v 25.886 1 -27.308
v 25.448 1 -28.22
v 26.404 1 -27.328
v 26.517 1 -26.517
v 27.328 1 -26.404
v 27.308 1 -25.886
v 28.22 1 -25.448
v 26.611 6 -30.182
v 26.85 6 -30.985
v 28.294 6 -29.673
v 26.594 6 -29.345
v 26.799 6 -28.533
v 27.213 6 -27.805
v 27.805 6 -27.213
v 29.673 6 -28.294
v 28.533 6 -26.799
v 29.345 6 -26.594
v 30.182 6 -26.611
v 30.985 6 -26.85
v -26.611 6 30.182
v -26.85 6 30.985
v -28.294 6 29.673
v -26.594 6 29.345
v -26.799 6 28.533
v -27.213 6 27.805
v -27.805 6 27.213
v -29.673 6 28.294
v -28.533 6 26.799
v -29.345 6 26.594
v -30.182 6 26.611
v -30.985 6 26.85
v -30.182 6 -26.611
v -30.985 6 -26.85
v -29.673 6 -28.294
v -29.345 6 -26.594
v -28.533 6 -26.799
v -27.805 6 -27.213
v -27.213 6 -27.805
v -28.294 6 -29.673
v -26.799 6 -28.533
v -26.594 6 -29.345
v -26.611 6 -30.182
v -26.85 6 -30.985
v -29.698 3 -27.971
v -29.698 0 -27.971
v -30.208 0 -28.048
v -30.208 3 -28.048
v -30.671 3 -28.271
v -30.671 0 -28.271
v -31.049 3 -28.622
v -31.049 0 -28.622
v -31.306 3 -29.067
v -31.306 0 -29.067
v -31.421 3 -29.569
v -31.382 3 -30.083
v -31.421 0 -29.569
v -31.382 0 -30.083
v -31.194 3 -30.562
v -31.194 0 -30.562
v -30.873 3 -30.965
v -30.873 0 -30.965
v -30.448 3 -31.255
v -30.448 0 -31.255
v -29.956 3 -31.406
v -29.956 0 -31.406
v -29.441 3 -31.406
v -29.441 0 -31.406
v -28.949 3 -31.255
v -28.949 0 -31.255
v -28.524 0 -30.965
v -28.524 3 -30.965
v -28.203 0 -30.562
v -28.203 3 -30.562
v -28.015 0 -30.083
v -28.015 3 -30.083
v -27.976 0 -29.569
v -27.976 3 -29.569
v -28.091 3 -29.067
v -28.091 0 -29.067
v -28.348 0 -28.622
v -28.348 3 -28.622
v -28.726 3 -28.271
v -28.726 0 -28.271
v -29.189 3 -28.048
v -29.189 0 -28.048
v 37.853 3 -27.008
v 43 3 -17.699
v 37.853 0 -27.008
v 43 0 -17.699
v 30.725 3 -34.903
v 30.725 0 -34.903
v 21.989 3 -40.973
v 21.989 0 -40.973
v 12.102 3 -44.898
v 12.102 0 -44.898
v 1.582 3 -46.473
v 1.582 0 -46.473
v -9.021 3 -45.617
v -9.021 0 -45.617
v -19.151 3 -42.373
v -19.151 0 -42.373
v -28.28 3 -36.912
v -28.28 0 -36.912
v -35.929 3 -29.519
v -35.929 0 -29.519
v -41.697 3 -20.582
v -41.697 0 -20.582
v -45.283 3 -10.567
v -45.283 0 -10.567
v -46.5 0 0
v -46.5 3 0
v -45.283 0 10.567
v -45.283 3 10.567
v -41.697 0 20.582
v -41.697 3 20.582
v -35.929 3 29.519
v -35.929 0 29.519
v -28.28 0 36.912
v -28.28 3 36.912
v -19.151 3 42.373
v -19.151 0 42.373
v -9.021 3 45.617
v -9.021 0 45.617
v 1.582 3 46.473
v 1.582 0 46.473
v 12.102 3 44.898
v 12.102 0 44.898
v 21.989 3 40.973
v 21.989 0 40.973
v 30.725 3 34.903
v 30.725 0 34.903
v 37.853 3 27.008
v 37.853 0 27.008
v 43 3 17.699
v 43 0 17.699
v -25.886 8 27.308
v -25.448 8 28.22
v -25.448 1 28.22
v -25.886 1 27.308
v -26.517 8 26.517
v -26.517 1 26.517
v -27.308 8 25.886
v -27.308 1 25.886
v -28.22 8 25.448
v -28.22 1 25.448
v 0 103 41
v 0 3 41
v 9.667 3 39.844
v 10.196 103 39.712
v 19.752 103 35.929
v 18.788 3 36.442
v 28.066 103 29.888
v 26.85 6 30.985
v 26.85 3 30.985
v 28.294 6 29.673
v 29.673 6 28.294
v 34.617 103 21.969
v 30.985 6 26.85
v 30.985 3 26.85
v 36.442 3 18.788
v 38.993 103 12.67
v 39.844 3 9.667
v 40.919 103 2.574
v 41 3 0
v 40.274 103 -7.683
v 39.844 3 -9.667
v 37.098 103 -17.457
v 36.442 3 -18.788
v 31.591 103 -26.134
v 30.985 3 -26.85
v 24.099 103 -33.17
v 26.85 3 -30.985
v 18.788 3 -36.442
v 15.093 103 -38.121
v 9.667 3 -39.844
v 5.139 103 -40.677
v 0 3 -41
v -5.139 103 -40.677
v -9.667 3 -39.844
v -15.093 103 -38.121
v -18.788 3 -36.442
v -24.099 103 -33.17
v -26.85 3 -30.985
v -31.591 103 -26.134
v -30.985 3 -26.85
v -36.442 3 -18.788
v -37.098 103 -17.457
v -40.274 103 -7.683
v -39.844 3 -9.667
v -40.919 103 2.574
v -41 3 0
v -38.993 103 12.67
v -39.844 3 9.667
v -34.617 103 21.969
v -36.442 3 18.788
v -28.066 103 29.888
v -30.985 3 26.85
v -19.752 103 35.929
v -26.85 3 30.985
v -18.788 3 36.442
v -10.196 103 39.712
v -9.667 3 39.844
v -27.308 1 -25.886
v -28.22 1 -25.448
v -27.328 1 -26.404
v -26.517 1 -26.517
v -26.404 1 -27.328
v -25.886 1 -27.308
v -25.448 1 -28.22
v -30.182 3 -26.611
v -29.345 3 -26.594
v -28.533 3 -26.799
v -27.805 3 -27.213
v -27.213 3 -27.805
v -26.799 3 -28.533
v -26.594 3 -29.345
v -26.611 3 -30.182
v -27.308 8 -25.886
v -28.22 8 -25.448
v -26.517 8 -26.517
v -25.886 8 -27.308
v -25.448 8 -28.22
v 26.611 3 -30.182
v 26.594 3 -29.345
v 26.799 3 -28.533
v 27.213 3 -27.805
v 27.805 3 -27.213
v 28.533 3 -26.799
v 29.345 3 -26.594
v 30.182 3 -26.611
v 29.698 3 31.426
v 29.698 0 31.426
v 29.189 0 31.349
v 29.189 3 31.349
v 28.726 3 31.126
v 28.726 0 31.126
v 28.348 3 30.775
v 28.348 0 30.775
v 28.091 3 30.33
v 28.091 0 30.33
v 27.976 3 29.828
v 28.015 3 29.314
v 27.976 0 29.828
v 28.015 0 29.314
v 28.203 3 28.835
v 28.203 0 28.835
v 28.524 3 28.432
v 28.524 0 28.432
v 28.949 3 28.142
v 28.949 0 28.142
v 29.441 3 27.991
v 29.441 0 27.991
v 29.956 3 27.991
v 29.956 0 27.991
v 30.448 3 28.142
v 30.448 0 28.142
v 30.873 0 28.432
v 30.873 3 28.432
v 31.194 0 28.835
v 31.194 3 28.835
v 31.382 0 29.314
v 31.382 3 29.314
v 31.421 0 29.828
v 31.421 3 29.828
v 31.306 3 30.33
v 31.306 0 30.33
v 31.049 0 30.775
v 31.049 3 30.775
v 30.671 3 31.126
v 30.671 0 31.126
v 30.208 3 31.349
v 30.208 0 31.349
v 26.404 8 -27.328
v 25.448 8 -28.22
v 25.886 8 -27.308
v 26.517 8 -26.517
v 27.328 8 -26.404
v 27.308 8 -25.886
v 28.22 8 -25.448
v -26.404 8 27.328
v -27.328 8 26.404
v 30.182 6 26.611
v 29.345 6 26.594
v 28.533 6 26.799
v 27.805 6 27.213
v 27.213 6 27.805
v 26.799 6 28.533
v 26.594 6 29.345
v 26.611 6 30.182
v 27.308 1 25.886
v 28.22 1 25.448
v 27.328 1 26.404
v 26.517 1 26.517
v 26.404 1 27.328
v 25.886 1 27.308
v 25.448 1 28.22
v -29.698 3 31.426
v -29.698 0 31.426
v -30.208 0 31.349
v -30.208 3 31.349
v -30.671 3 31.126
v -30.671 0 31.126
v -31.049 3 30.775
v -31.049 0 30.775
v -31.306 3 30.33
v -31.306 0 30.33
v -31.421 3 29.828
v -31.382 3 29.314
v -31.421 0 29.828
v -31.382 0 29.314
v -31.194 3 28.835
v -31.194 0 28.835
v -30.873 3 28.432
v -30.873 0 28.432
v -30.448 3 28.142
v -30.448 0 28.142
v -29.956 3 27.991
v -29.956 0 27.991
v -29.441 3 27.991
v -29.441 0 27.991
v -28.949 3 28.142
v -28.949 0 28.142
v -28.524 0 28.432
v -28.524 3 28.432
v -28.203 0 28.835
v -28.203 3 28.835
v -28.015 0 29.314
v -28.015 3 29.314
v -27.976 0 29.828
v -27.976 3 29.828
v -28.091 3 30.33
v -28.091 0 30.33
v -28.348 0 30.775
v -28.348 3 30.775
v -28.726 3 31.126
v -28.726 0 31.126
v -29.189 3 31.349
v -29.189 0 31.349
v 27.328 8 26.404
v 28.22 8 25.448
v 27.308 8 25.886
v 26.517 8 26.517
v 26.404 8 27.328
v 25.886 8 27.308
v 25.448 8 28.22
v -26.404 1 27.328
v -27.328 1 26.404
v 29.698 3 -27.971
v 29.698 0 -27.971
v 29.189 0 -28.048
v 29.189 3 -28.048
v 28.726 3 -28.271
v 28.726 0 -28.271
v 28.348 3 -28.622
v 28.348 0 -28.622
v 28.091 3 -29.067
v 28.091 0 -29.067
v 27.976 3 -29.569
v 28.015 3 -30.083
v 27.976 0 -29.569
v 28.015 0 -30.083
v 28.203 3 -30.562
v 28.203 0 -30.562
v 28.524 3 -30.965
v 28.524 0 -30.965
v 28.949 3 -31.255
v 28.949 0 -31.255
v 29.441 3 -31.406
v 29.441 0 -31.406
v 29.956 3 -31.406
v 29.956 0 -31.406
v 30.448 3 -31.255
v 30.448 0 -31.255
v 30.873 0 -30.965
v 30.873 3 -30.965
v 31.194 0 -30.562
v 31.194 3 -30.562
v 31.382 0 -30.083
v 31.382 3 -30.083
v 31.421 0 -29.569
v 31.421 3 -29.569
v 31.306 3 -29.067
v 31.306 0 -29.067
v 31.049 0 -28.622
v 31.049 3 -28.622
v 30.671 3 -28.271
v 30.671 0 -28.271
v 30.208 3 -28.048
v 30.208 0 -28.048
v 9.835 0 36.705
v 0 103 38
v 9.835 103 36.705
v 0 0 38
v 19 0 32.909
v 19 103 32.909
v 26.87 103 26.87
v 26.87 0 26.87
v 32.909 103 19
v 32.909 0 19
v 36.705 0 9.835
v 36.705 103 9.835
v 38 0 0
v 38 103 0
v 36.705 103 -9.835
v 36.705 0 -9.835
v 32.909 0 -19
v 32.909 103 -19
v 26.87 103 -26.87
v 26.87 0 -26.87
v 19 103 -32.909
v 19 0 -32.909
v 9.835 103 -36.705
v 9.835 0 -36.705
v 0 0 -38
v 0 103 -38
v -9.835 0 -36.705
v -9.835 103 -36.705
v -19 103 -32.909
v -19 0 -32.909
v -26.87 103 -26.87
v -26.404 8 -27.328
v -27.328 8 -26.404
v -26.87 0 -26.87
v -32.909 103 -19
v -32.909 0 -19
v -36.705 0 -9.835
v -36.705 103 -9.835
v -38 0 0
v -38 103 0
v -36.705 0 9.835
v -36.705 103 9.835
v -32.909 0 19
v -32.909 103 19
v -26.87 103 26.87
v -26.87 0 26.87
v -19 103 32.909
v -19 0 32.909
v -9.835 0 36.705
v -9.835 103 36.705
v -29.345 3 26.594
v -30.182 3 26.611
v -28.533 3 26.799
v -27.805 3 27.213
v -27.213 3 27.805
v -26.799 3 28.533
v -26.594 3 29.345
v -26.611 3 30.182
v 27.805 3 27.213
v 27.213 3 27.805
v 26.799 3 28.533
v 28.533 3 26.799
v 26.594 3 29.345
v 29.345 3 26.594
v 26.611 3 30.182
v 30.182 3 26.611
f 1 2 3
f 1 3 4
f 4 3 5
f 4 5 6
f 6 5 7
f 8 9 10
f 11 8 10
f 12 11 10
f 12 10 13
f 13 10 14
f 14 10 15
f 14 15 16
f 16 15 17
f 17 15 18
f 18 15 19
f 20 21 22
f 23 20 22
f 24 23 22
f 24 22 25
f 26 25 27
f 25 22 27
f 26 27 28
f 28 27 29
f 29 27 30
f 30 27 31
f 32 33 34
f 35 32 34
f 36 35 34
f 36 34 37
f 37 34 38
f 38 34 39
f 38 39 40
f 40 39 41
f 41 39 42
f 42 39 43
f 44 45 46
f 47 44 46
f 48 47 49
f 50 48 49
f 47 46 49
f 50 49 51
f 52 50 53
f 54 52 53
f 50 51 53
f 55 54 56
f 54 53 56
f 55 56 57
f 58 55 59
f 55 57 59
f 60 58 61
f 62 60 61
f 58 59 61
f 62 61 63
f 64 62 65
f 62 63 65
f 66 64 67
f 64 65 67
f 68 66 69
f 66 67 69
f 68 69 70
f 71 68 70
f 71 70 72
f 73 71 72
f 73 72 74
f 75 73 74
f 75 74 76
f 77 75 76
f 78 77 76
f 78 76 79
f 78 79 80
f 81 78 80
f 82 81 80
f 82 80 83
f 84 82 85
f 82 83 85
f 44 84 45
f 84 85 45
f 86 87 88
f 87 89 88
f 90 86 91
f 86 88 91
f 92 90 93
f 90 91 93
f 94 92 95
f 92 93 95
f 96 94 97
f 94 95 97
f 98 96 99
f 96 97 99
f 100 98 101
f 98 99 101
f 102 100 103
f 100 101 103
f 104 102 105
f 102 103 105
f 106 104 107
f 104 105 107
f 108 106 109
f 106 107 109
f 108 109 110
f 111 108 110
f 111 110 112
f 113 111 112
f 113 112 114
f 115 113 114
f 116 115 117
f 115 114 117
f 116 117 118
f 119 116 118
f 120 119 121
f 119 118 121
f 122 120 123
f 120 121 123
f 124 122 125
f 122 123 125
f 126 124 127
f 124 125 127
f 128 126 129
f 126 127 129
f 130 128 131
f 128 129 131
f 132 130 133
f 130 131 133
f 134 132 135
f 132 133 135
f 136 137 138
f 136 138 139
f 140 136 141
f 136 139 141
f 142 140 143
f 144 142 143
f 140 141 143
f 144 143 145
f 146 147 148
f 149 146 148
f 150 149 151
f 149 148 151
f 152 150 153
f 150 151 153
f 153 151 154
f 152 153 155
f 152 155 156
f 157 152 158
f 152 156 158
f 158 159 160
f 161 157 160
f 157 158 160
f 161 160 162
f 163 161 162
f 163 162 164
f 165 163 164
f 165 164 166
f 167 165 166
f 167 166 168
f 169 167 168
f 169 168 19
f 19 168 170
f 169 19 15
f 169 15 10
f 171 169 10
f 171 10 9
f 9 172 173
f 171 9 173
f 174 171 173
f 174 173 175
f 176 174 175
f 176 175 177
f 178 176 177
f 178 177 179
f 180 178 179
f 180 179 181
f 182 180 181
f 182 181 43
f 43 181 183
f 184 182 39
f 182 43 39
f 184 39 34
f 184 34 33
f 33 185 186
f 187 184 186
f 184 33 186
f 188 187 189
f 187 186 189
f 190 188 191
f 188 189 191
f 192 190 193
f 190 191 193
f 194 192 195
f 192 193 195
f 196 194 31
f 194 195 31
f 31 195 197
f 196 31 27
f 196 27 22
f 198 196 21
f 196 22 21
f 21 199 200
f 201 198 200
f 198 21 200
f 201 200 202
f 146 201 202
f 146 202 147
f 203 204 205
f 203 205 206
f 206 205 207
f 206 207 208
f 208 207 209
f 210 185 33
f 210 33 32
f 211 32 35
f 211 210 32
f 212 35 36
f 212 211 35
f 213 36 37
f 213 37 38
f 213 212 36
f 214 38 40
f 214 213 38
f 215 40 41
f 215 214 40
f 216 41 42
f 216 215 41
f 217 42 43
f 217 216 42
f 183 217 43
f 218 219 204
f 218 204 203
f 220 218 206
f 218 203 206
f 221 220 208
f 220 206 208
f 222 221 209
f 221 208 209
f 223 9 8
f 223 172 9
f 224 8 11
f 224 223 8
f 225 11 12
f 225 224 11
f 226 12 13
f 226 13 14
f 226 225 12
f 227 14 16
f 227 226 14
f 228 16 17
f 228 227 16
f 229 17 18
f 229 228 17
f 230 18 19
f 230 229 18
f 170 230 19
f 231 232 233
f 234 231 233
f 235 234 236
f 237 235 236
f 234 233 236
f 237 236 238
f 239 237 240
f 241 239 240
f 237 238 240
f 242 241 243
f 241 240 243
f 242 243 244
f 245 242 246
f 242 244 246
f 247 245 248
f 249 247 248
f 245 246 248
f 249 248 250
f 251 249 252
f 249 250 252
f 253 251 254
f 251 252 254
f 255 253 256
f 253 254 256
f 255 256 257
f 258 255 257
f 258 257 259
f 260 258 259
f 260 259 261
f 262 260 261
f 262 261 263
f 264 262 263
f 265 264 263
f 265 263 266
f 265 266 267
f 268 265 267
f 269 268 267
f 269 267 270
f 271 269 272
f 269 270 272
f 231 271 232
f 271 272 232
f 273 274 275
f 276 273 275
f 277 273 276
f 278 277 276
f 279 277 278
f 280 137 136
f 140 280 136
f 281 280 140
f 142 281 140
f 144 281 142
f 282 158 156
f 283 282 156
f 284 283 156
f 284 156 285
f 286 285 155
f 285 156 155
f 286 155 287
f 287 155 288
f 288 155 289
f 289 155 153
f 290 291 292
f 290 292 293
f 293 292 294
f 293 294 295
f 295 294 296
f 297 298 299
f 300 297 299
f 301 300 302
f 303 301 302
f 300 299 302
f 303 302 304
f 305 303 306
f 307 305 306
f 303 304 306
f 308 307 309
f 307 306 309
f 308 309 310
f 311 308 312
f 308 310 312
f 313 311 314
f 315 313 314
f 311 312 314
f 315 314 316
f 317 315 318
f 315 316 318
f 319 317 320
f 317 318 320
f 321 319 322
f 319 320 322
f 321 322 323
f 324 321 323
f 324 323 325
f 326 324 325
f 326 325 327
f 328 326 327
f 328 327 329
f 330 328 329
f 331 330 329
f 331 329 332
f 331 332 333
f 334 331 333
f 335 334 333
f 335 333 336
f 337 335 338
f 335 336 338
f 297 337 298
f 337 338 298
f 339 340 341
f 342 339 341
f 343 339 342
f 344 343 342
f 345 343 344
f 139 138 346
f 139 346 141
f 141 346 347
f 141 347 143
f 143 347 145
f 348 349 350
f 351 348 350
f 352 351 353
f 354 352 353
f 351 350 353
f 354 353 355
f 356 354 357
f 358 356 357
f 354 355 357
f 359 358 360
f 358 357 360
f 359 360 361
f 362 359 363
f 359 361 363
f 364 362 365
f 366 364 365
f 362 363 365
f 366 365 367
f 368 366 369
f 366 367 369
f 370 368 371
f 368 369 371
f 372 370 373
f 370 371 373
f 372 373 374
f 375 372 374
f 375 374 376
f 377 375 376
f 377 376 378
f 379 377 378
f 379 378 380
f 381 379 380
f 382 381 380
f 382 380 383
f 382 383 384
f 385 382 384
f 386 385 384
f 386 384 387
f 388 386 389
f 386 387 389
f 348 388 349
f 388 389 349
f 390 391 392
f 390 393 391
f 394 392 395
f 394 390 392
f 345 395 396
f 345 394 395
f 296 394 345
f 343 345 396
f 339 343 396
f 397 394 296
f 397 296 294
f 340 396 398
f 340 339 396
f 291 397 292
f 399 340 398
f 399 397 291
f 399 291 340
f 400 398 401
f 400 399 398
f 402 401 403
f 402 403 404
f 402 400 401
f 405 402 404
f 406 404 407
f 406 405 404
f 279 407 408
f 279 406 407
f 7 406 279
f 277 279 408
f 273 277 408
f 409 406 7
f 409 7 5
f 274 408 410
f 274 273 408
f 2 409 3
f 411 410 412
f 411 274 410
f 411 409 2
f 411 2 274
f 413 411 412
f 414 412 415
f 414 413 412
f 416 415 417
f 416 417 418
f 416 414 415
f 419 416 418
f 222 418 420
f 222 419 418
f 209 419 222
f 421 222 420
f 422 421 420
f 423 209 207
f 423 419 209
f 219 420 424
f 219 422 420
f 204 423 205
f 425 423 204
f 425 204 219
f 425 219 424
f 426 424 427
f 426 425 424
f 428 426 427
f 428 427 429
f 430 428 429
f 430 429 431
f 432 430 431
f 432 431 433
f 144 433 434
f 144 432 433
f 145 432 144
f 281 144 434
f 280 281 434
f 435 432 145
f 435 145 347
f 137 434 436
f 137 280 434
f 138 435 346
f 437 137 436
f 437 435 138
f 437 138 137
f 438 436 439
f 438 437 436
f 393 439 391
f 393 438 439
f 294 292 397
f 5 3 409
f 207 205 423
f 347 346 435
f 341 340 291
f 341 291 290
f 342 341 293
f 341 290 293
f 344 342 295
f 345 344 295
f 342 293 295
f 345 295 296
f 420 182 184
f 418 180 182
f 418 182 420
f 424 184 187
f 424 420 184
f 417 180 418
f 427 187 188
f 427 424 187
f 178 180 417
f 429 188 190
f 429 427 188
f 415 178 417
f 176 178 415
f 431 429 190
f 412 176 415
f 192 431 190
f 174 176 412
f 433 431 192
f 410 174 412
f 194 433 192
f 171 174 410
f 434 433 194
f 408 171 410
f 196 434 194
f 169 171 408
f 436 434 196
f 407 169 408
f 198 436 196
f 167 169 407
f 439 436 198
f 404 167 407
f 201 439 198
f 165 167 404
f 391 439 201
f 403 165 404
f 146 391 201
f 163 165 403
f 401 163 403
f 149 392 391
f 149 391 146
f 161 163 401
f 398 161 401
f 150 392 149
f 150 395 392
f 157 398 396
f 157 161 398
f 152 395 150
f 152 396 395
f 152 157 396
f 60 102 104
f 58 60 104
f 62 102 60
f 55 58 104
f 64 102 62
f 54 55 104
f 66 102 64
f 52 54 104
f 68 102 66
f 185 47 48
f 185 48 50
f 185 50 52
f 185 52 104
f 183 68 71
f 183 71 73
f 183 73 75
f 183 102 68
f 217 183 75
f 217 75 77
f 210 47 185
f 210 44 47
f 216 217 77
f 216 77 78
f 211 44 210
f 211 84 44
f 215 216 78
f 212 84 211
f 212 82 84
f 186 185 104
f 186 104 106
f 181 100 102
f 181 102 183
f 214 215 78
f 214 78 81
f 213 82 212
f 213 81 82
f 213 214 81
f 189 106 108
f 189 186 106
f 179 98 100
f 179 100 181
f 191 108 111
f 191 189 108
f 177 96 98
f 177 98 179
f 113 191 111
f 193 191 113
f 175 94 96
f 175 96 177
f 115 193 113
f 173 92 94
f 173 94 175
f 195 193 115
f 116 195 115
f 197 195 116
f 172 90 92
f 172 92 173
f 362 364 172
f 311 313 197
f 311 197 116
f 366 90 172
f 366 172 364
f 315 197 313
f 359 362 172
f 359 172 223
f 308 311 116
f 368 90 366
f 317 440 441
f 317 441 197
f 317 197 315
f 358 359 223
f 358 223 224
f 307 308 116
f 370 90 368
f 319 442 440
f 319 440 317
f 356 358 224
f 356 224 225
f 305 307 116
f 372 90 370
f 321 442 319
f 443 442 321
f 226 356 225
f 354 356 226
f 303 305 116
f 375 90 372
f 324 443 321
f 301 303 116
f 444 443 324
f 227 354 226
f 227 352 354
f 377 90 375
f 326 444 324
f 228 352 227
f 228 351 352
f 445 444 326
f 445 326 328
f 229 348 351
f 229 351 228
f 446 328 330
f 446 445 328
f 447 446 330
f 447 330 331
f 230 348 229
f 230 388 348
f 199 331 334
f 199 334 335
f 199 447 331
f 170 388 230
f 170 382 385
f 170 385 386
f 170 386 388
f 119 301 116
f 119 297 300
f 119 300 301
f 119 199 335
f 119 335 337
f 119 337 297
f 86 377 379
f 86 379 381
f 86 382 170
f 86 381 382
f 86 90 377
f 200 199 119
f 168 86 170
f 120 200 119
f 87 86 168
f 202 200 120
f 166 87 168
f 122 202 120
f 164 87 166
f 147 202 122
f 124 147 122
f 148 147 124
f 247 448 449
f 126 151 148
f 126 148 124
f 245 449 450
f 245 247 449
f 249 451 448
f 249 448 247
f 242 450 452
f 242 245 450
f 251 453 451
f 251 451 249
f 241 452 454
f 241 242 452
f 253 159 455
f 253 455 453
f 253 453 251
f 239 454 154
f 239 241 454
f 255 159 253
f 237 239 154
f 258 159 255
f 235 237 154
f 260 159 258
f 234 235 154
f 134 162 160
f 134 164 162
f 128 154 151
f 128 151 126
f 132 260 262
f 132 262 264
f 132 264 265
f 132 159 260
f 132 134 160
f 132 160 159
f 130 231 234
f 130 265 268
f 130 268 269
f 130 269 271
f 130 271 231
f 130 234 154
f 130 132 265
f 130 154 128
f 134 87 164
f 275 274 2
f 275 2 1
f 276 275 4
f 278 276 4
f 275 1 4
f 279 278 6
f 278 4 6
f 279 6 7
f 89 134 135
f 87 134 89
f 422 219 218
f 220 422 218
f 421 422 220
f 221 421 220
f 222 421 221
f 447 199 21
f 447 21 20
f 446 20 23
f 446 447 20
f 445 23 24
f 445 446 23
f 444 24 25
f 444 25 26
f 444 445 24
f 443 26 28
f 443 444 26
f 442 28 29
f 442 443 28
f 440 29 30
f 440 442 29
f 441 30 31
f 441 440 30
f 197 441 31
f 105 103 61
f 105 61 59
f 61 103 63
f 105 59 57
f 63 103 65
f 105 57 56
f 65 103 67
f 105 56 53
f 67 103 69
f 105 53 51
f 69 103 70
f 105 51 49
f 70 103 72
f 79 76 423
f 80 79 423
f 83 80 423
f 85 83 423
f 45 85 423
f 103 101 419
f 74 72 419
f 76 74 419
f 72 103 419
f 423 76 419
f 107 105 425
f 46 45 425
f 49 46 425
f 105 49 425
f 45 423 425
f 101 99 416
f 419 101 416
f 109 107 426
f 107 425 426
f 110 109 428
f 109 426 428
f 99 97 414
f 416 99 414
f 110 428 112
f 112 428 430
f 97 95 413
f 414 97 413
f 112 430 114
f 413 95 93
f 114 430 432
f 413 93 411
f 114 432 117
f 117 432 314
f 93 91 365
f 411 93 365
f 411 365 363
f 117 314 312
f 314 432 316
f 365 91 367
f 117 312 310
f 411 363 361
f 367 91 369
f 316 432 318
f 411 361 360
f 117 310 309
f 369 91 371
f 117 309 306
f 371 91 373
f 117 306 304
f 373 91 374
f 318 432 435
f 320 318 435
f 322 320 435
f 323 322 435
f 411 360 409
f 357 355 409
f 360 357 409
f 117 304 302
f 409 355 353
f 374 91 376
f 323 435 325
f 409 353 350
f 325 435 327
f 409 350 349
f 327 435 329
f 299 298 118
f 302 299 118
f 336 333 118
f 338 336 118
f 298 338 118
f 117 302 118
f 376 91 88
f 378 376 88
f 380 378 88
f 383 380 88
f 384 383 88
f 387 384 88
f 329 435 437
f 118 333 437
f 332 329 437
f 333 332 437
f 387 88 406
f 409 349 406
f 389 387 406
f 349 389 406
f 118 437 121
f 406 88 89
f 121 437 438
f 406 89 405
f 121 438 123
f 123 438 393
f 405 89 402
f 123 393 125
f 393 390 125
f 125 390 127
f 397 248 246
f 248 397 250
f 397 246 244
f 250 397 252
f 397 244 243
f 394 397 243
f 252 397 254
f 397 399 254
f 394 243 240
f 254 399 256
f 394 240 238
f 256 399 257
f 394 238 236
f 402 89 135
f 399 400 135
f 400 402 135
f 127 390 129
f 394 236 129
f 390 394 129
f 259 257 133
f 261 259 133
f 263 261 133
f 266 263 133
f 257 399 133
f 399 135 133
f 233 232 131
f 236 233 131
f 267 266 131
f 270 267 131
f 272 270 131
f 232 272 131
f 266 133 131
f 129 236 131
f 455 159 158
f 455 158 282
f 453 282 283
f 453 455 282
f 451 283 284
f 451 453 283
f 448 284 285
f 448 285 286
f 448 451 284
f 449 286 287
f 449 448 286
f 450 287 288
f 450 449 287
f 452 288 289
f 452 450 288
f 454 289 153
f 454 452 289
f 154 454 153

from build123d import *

# Parameters (mm, degrees)
SKETCH1_R                      = 46.5
SKETCH1_R_2                    = 38
BOSS_EXTRUDE1_DEPTH            = 3
SKETCH2_R                      = 41
SKETCH2_R_2                    = 38
BOSS_EXTRUDE2_DEPTH            = 100
SKETCH4_W                      = 1.7272
SKETCH4_H                      = 3
F_4_CLEARANCE_HOLE1_AT_2_COUNT = 2
F_4_CLEARANCE_HOLE1_AT_2_PITCH = 59.39696962
F_4_CLEARANCE_HOLE1_AT_3_COUNT = 2
F_4_CLEARANCE_HOLE1_AT_3_PITCH = 84
F_4_CLEARANCE_HOLE1_AT_4_COUNT = 2
F_4_CLEARANCE_HOLE1_AT_4_PITCH = 59.39696962
SKETCH5_R                      = 3.125
CUT_EXTRUDE1_DEPTH             = 3
BOSS_EXTRUDE3_START            = -2
BOSS_EXTRUDE3_DEPTH            = 7
CIRPATTERN3_COUNT              = 4
CUT_EXTRUDE2_DEPTH             = 120.685003238


with BuildPart() as part:
    # Sketch1 → Boss-Extrude1 (new body)
    with BuildSketch(Plane(origin=(0, 0, 0), x_dir=(1, 0, 0), z_dir=(0, 1, 0))):
        with Locations(Location((0, 0, 0), (0, 0, 270))):
            Circle(SKETCH1_R)
        with Locations(Location((0, 0, 0), (0, 0, 270))):
            Circle(SKETCH1_R_2, mode=Mode.SUBTRACT)
    extrude(amount=BOSS_EXTRUDE1_DEPTH)

    # Sketch2 → Boss-Extrude2 (add)
    with BuildSketch(Plane(origin=(0, 3, 0), x_dir=(1, 0, 0), z_dir=(0, 1, 0))):
        with Locations(Location((0, 0, 0), (0, 0, 270))):
            Circle(SKETCH2_R)
        with Locations(Location((0, 0, 0), (0, 0, 270))):
            Circle(SKETCH2_R_2, mode=Mode.SUBTRACT)
    extrude(amount=BOSS_EXTRUDE2_DEPTH)

    # Sketch4 → #4 Clearance Hole1 (revolve, cut)
    with BuildSketch(Plane(origin=(-29.69848481, 3, -29.69848481), x_dir=(0, 0, 1), z_dir=(1, 0, 0))):
        with Locations((0.8636, 1.5)):
            Rectangle(SKETCH4_W, SKETCH4_H)
    f_4_clearance_hole1 = revolve(axis=Axis((-29.69848481, 9.35, -29.69848481), (0, -1, 0)), mode=Mode.SUBTRACT)

    # #4 Clearance Hole1 at 2: #4 Clearance Hole1 ×2
    with Locations(*[(i * F_4_CLEARANCE_HOLE1_AT_2_PITCH, 0, 0) for i in range(1, F_4_CLEARANCE_HOLE1_AT_2_COUNT)]):
        add(f_4_clearance_hole1, mode=Mode.SUBTRACT)

    # #4 Clearance Hole1 at 3: #4 Clearance Hole1 ×2
    with Locations(*[Vector(0.7071067811865476, 0, 0.7071067811865476) * (i * F_4_CLEARANCE_HOLE1_AT_3_PITCH) for i in range(1, F_4_CLEARANCE_HOLE1_AT_3_COUNT)]):
        add(f_4_clearance_hole1, mode=Mode.SUBTRACT)

    # #4 Clearance Hole1 at 4: #4 Clearance Hole1 ×2
    with Locations(*[(0, 0, i * F_4_CLEARANCE_HOLE1_AT_4_PITCH) for i in range(1, F_4_CLEARANCE_HOLE1_AT_4_COUNT)]):
        add(f_4_clearance_hole1, mode=Mode.SUBTRACT)

    # Sketch5 → Cut-Extrude1 (cut)
    with BuildSketch(Plane(origin=(0, 3, 0), x_dir=(1, 0, 0), z_dir=(0, 1, 0))):
        with Locations((-29.69848481, 29.69848481)):
            Circle(SKETCH5_R)
    cut_extrude1 = extrude(amount=CUT_EXTRUDE1_DEPTH, mode=Mode.SUBTRACT)

    # Sketch6 → Boss-Extrude3 (add)
    with BuildSketch(Plane(origin=(0, 3, 0), x_dir=(1, 0, 0), z_dir=(0, 1, 0)).offset(BOSS_EXTRUDE3_START)):
        with BuildLine():
            ThreePointArc((-31.890308819, 25.76835663), (-26.516504294, 26.516504294), (-25.76835663, 31.890308819))
            ThreePointArc((-25.76835663, 31.890308819), (-26.313305576, 31.442168336), (-26.850462289, 30.984716795))
            ThreePointArc((-26.850462289, 30.984716795), (-27.488776119, 27.488776119), (-30.984716795, 26.850462289))
            ThreePointArc((-30.984716795, 26.850462289), (-31.442168336, 26.313305576), (-31.890308819, 25.76835663))
        make_face()
    boss_extrude3 = extrude(amount=BOSS_EXTRUDE3_DEPTH)

    # CirPattern3: Cut-Extrude1, Boss-Extrude3 ×4 about axis
    cirpattern3_axis = Axis((0, 0, 0), (0, 1, 0))
    add([cut_extrude1.rotate(cirpattern3_axis, i * 360 / CIRPATTERN3_COUNT) for i in range(1, CIRPATTERN3_COUNT)], mode=Mode.SUBTRACT)
    add([boss_extrude3.rotate(cirpattern3_axis, i * 360 / CIRPATTERN3_COUNT) for i in range(1, CIRPATTERN3_COUNT)])

    # Sketch7 → Cut-Extrude2 (cut, through all)
    with BuildSketch(Plane(origin=(0, 3, 0), x_dir=(1, 0, 0), z_dir=(0, 1, 0))):
        with BuildLine():
            Line((43, -17.69887002), (43, 17.69887002))
            ThreePointArc((43, 17.69887002), (46.5, 0), (43, -17.69887002))
        make_face()
    extrude(amount=-CUT_EXTRUDE2_DEPTH, mode=Mode.SUBTRACT)


solid = part.part
